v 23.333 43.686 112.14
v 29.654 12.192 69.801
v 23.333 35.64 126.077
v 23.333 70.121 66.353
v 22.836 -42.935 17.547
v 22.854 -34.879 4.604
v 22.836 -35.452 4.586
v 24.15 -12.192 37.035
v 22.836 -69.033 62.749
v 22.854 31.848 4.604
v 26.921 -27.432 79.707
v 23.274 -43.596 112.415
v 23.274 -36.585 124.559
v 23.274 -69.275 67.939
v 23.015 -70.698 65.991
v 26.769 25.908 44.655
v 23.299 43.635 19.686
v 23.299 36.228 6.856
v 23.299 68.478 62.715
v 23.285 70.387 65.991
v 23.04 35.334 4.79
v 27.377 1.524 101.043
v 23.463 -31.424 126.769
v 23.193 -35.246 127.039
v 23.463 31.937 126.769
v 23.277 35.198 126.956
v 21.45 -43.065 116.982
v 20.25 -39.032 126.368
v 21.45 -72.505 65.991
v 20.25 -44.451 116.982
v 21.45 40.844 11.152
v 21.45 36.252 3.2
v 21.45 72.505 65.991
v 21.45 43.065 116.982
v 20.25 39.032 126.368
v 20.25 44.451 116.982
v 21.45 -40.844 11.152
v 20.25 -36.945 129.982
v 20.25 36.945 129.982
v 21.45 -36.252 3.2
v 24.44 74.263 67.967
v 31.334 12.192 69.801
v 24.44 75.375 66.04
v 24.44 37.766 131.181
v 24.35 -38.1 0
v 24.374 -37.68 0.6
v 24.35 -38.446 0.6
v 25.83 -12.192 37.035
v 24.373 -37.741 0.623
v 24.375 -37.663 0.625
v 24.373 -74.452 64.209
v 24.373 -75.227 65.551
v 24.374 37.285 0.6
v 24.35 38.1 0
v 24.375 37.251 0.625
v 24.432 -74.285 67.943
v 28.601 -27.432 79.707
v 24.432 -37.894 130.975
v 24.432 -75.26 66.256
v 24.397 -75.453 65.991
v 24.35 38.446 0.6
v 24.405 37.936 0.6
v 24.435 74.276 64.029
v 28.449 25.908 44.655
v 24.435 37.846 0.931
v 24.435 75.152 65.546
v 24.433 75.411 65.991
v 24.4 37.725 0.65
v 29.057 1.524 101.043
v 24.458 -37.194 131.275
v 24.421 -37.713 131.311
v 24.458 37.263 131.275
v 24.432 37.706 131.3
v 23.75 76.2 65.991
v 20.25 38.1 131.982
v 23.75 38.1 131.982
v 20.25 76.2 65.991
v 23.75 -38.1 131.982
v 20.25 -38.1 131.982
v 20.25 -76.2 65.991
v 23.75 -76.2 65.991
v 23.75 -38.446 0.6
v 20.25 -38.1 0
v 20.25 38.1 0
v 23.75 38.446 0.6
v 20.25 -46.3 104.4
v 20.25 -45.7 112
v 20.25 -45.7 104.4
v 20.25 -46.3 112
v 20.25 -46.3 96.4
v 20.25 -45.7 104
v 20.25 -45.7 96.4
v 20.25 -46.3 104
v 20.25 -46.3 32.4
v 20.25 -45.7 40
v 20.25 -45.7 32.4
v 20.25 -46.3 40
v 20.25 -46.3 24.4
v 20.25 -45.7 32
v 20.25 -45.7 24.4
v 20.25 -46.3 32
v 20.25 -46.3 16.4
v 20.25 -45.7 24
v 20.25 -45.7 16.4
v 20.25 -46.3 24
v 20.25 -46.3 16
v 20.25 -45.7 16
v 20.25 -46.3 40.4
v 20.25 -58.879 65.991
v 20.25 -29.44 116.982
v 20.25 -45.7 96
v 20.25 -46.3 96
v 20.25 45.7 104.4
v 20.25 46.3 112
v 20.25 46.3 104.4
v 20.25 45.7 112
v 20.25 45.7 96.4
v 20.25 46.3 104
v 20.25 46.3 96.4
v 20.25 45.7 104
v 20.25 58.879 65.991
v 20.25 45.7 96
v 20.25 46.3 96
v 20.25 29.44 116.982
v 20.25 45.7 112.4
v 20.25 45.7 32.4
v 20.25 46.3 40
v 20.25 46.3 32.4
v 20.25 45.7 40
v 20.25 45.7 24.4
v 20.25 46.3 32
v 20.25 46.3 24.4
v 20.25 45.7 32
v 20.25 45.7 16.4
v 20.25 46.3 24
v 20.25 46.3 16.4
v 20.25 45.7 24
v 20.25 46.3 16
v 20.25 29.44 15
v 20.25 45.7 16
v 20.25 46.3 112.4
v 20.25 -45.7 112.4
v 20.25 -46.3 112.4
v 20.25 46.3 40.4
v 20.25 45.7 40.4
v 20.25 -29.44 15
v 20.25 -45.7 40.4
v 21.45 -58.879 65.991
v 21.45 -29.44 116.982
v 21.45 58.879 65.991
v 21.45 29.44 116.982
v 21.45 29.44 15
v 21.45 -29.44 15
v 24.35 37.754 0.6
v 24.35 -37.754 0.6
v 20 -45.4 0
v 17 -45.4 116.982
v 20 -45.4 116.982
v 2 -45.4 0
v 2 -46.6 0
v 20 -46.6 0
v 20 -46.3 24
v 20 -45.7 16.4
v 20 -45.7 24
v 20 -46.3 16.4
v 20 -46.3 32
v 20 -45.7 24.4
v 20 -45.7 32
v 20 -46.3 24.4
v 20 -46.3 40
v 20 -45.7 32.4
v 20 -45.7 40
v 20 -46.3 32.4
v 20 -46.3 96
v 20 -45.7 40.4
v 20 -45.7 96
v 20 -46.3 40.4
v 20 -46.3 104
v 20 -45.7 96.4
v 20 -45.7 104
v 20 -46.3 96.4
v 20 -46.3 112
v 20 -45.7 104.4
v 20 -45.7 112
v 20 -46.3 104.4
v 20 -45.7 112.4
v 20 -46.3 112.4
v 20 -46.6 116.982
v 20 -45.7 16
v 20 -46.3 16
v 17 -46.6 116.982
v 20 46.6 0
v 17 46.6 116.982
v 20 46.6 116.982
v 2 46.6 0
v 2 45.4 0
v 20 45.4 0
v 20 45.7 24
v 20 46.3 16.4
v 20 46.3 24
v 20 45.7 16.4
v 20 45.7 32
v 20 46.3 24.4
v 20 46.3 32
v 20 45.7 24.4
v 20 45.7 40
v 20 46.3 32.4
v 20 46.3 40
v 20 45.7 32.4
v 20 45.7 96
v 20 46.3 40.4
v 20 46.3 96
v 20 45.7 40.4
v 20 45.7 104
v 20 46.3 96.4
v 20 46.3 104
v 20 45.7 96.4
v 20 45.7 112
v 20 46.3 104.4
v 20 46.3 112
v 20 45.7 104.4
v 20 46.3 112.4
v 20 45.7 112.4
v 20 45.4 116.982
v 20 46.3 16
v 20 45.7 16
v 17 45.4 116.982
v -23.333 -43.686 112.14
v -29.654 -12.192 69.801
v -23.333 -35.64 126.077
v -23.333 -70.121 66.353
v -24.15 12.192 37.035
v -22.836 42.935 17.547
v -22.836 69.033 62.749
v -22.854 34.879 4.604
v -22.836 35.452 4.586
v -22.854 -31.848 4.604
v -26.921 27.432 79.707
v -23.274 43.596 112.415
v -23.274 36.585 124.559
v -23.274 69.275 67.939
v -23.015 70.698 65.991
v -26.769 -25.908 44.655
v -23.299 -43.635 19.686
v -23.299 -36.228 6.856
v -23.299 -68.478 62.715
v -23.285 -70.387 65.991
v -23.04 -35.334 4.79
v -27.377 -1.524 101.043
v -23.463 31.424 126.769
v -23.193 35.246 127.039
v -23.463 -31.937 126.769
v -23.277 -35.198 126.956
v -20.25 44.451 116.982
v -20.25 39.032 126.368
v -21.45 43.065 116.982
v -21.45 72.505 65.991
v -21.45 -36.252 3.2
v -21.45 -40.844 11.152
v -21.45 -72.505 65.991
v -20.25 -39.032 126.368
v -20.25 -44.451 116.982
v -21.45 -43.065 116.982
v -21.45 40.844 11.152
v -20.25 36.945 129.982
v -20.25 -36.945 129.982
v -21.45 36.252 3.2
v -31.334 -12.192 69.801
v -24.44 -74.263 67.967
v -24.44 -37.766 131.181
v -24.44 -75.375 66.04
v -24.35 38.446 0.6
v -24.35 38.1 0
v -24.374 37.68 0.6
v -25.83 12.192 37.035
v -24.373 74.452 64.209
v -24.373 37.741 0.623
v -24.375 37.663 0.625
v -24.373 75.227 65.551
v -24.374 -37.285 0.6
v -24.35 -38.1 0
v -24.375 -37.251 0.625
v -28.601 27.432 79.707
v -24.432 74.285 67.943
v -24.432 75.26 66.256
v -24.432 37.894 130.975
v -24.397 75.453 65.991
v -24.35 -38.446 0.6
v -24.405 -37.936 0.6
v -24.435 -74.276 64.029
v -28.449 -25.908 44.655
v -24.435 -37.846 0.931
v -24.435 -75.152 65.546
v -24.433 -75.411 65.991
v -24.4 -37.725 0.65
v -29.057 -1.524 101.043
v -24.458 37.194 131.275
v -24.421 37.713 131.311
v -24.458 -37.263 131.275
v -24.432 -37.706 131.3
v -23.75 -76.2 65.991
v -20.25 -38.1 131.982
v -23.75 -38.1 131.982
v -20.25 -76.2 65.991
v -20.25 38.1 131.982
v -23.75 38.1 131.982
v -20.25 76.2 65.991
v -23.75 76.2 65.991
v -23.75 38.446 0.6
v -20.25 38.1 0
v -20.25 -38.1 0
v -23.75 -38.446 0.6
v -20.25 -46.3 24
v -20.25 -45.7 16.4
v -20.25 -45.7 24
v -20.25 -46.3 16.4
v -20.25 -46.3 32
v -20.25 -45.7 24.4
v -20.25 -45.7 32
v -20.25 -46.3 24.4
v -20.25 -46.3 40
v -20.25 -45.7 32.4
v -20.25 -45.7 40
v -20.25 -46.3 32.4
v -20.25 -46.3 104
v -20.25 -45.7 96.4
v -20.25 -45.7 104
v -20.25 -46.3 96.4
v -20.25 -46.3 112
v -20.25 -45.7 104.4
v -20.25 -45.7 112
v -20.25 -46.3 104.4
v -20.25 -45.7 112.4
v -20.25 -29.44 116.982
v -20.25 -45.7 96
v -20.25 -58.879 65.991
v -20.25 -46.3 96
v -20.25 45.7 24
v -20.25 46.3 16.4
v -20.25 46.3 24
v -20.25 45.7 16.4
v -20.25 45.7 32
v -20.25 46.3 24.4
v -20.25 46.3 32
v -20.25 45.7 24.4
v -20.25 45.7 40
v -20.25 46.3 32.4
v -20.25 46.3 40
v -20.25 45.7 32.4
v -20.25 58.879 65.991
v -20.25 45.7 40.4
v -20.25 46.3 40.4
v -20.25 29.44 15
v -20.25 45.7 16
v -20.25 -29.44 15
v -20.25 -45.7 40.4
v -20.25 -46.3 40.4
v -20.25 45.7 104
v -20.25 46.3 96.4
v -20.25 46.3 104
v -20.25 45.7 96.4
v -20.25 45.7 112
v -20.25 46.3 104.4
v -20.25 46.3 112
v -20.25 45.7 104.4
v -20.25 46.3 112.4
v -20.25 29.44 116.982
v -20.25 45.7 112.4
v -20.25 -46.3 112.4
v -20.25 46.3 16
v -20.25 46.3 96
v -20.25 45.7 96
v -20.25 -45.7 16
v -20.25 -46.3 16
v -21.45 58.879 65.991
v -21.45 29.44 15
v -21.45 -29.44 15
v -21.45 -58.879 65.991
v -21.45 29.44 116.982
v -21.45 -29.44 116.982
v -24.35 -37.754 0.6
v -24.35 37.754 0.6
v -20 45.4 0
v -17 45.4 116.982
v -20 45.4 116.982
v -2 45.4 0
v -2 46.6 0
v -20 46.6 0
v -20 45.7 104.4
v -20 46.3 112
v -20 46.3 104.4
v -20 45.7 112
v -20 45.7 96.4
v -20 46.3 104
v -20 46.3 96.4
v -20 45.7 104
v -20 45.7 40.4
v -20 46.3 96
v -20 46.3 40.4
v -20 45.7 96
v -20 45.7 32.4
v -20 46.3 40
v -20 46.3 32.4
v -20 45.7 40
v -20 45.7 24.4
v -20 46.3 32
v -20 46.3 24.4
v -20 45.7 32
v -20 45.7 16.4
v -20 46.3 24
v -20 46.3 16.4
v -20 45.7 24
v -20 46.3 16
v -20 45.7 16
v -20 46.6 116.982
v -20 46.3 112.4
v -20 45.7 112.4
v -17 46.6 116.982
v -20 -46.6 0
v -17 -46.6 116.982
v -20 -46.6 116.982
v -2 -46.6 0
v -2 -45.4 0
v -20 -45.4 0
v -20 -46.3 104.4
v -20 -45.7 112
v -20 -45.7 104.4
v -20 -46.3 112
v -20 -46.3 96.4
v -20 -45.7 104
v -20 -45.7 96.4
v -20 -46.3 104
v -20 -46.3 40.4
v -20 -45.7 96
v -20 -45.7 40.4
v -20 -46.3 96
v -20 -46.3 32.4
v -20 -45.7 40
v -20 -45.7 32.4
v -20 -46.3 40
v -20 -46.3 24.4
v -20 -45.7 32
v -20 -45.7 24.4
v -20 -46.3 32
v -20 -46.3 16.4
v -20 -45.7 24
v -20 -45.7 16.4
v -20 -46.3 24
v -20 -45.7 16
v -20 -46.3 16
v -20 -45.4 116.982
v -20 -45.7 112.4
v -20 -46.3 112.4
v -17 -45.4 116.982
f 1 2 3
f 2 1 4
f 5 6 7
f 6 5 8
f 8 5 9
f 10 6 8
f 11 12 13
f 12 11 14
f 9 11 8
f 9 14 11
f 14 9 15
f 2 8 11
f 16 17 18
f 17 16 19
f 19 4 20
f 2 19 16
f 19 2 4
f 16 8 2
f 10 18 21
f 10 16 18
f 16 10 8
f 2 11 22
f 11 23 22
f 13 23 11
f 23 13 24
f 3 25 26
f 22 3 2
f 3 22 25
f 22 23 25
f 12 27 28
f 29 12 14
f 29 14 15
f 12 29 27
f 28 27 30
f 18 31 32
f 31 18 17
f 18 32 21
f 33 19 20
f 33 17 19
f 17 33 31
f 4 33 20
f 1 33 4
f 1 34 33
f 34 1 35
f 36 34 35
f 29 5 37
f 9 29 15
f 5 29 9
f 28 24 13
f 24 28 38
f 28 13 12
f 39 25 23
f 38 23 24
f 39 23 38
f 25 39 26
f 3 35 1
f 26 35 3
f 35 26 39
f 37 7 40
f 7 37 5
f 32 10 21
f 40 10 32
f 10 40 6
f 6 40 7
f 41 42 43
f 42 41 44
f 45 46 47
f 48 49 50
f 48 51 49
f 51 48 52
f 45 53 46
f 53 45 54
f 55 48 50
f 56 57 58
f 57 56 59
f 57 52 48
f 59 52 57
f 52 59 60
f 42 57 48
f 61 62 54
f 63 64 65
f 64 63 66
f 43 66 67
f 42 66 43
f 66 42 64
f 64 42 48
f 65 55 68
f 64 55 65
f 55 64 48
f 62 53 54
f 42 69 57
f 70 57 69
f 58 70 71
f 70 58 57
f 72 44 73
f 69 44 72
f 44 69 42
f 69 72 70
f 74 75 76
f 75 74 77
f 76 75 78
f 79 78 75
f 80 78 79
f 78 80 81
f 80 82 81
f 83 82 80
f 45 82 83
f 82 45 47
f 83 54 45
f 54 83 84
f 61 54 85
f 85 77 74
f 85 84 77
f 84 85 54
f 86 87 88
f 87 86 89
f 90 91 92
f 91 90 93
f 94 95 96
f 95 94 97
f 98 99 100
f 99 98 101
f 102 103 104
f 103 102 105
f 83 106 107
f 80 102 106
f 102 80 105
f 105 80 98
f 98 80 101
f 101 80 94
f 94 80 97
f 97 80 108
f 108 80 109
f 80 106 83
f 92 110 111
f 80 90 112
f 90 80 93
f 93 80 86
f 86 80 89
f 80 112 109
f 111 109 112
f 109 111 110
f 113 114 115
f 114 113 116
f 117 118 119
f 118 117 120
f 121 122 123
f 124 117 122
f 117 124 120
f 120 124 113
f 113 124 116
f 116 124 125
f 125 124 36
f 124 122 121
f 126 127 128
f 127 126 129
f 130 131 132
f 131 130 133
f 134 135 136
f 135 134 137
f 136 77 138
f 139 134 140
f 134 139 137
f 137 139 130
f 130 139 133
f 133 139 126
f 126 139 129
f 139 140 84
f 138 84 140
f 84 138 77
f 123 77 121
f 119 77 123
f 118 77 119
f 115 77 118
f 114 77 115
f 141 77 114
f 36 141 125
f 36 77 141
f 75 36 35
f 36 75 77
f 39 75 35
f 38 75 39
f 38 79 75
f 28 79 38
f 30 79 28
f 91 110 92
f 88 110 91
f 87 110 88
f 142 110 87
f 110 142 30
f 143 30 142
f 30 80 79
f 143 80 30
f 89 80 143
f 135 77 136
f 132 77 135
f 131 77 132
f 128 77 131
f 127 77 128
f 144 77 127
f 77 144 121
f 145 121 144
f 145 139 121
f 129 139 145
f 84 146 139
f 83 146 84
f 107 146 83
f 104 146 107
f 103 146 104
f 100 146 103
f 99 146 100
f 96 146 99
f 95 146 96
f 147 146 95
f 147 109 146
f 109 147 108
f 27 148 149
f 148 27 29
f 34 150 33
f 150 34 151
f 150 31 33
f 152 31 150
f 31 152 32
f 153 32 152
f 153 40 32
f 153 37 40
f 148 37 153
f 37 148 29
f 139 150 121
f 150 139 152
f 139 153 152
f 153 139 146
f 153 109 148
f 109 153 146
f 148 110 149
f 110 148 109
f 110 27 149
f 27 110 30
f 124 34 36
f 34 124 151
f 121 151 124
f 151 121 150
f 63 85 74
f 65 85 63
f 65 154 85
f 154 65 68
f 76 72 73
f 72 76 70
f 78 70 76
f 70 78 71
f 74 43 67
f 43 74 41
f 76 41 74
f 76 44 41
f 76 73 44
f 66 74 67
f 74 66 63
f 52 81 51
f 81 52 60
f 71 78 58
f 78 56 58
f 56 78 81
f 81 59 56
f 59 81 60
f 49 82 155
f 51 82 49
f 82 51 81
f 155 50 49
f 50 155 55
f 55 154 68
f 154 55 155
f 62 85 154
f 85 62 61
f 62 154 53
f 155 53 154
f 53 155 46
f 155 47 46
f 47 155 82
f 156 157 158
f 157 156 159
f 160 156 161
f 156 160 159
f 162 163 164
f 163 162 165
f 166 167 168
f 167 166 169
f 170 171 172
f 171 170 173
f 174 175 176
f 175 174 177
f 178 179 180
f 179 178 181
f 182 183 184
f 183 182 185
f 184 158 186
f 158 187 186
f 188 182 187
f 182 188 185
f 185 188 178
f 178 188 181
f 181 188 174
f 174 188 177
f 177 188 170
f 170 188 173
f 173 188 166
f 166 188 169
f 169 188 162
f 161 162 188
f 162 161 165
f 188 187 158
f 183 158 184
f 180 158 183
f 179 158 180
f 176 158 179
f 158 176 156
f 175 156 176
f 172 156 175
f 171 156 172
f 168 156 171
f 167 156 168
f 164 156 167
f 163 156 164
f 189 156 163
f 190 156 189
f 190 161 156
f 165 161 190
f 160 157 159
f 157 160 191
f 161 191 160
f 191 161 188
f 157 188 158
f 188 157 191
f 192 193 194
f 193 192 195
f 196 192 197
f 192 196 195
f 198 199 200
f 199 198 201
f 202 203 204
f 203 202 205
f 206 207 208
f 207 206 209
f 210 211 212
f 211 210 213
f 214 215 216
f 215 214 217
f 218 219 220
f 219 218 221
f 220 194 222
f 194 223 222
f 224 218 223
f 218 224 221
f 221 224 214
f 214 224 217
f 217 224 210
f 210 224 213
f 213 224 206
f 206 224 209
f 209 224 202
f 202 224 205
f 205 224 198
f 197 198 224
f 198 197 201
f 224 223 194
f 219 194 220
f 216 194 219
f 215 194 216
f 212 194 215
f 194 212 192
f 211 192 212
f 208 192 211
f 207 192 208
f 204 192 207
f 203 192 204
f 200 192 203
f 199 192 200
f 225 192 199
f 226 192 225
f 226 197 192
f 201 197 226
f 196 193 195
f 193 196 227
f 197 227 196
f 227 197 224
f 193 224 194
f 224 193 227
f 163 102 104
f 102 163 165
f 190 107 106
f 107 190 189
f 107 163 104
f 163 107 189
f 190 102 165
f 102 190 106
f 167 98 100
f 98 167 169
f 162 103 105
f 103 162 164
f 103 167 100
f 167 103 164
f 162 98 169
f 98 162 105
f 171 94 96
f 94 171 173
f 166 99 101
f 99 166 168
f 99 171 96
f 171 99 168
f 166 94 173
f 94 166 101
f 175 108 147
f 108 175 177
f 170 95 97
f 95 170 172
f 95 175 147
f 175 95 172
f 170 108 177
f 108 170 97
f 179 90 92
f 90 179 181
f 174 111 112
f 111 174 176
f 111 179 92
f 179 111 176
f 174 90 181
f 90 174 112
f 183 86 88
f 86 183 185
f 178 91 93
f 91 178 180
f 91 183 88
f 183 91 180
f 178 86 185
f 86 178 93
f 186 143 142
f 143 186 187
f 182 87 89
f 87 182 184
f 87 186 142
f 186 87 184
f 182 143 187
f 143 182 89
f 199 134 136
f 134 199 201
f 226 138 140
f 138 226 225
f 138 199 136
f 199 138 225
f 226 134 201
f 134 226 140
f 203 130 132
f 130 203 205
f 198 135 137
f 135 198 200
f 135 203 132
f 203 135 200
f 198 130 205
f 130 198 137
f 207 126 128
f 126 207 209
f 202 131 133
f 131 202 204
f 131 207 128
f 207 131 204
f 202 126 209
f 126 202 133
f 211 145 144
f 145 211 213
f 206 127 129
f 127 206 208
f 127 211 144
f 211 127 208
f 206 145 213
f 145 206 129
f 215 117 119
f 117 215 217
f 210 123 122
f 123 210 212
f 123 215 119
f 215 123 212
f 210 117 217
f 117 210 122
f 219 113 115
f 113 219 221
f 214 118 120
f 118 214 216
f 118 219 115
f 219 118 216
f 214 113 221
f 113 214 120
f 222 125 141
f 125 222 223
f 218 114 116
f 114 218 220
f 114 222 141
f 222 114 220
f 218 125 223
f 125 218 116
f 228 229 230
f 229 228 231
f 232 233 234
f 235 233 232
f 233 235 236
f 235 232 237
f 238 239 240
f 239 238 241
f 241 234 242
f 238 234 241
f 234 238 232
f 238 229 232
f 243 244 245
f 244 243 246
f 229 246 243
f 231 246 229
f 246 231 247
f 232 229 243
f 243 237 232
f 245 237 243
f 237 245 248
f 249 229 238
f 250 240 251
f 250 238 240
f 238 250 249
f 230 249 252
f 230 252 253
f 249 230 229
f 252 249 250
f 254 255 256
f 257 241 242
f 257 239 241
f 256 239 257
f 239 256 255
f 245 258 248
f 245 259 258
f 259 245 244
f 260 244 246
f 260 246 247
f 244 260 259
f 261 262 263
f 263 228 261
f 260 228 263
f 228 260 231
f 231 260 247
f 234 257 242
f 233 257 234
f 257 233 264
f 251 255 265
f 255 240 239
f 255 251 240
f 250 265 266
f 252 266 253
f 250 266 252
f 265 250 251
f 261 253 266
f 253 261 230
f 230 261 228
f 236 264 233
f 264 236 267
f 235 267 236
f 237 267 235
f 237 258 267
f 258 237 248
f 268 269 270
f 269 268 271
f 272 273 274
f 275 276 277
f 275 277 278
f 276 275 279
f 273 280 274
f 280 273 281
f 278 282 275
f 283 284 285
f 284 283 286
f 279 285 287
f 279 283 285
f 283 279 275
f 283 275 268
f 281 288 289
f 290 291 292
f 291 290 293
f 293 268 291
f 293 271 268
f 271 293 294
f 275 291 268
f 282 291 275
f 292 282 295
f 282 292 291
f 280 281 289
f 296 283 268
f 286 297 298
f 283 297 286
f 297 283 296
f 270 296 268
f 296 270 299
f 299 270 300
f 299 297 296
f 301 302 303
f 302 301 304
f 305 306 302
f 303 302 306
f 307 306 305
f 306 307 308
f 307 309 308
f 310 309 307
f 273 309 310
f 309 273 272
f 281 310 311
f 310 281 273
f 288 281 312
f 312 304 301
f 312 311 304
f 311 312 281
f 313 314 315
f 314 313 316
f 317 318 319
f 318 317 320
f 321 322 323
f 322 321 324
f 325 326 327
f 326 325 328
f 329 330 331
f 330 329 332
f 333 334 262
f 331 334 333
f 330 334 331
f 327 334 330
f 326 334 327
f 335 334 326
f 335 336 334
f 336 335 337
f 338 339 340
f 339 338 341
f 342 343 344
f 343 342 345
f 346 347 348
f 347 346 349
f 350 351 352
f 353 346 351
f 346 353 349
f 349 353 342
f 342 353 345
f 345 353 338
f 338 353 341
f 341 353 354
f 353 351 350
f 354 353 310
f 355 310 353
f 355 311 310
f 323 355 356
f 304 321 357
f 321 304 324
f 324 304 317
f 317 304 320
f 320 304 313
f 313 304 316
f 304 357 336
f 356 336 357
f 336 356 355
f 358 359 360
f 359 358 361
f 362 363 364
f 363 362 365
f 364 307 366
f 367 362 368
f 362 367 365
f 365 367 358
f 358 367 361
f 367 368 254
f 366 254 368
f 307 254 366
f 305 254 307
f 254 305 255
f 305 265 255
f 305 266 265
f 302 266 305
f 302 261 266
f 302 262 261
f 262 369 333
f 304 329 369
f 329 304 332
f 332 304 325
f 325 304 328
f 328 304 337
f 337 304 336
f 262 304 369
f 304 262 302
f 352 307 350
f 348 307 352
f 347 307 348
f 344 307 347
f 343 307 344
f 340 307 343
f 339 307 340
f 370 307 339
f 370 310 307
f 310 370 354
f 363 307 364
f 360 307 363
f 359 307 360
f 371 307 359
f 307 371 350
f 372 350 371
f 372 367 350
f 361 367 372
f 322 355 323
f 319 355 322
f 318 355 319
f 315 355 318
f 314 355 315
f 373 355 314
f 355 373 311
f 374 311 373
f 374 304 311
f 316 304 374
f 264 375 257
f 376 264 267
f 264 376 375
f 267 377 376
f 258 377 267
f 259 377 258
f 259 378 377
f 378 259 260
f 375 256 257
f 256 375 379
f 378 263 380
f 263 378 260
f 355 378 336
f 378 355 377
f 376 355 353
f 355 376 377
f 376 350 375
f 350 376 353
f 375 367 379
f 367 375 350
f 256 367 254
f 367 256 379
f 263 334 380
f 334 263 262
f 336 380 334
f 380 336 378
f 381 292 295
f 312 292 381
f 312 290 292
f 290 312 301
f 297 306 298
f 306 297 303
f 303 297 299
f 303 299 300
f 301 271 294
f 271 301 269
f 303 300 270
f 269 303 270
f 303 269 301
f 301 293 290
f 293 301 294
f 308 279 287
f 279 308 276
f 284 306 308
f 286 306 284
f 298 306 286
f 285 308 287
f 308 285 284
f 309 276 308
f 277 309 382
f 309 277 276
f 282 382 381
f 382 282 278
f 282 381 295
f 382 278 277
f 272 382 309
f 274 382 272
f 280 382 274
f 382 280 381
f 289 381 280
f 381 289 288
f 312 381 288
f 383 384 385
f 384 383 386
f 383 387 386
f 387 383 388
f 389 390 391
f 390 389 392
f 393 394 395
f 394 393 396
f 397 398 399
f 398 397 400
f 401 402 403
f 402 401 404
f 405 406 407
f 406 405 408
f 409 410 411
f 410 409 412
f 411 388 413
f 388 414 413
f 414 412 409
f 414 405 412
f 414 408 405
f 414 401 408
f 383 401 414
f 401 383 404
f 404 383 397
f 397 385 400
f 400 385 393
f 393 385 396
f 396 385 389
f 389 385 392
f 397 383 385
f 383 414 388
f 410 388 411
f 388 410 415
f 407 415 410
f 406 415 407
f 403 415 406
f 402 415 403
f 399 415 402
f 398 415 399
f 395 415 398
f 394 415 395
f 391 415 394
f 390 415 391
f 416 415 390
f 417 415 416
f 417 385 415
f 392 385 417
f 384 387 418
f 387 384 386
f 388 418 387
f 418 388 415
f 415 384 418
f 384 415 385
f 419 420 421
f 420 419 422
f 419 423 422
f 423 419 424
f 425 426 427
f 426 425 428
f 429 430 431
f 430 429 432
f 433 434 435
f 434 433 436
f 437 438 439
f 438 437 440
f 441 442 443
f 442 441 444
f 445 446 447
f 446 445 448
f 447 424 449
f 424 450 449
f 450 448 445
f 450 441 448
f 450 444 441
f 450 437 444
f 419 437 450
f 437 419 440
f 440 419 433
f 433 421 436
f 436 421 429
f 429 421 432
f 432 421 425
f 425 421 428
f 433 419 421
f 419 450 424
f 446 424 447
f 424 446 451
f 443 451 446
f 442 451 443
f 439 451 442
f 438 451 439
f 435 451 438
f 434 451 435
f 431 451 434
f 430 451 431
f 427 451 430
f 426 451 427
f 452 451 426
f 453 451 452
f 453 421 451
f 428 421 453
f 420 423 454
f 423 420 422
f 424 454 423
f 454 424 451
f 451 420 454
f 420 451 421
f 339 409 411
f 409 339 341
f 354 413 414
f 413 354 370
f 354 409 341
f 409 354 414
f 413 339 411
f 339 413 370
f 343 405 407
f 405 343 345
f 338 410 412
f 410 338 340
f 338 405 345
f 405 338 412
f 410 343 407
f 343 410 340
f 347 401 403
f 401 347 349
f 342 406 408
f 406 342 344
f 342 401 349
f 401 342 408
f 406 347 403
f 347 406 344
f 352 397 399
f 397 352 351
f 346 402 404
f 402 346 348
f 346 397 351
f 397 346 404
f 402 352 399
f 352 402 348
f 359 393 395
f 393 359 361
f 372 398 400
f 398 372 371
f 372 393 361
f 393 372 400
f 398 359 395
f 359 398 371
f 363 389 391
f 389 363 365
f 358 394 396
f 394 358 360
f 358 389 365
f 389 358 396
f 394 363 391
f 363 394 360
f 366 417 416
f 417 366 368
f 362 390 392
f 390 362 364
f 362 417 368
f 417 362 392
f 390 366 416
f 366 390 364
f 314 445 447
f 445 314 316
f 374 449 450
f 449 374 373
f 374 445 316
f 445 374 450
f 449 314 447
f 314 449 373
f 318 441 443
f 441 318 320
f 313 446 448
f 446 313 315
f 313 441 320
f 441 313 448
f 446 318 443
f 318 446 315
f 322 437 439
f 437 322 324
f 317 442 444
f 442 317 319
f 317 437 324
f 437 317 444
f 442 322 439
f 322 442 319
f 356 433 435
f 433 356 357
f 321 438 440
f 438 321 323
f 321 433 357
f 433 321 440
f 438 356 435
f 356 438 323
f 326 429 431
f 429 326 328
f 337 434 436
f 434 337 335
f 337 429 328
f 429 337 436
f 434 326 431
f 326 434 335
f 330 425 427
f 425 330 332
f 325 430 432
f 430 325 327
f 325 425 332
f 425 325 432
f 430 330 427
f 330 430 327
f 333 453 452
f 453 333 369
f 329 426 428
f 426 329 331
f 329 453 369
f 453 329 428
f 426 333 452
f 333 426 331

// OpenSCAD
/* HEX TILE v76 — reviewed native parametric OpenSCAD; millimetres.
   Standalone: no imports, missing modules, embedded STL or fused base rail.
   Default (v76) is TWO UNJOINED tiles, each braced by two back-border fins.
   'pair' keeps the v75 tacked pair. 'chain' lays out independent pairs.
   F5 = preview. F6 = render; then File > Export > STL.
   Fins: one material → 'finned' (fins kiss the border through small tacks;
   cut the tacks, then lift the fin away). Two materials → set fin_gap = 0,
   export 'finned_tiles' and 'finned_fins', load both as parts of one object
   and give the fins Support for PLA (or PETG).
   Pair: cut center necks before separating. Do not twist, peel or pry tile faces.
   Geometry checks cannot certify clean release, finish or print stability.
   OpenSCAD 2026.10.11 + Manifold tested; slicer remains authoritative.
*/

/* [Output] */
output = "finned"; // [finned, finned_tiles, finned_fins, pair, chain, wall, flat, separated, tabs, section, release_test]
inspection_spacing = 18;
show_markers = false; // Preview only; excluded from exported geometry.

/* [Tile geometry] */
size_in = 6;
edge_depth = 4.1;
rim = 2.0;
skin = 1.68; // v73: was 1.2 (v70–v72); 1.7 trips the clearance assert by float rounding. Vertical offset of faceted surface; not normal wall thickness.
relief_scale = 1.0;
front_chamfer = 0.6; // v73: back to v70 (v72 had 0.15, chip-prone edge).
// v74: leave the bed edge square. v73's 0.6 chamfer there undercut the first layer
// (9.0 mm footprint vs 10.4 mm just above); four upright prints tore off above the brim.
chamfer_bed_edge = false;
back_edge_chamfer = 0; // Maximize flat mounting surface; optional small bevel.
/* [Open back and wall-mounting flange] */
back_ring_width = 15;    // Wide enough for ~1/2 in (12.7 mm) foam tape with placement margin.
back_ring_t = 1.2;

// Keep the broad horizontal top flange omitted for upright printing.
// The other five continuous flange segments remain supported as they grow.
include_top_flange = false;
minimum_front_clearance = 1.2;

/* [Cuttable connections] */
pair_gap = 2.0;
root_width = 1.0;
root_height = 0.6;
root_overlap = 0.30; // Embed into flange, not a prediction of residual stub height.
neck_width = 0.60;
neck_height = 0.40;
neck_length = 0.40;
tab_pitch = 13; // v75: was 12 (7 tacks/side, 42/pair); 13 gives 6/side, 36/pair. Owner: "hard to seperate".

/* [Layer checks — match slicer] */
layer_height = 0.20;
first_layer_height = 0.20;
line_width = 0.42; // Check only; SCAD cannot set slicer extrusion width/nozzle.
enforce_event_limits = true;
root_event_limit = 2;       // Per-pair root transition cap.
all_event_limit = 3;        // Per-pair root + neck transition cap.

// Preserve the proven v70 three-pair chain while making its aggregate
// transition budget explicit. Lower these if slicer testing supports it.
enforce_batch_event_limits = true;
batch_root_event_limit = 6;
batch_all_event_limit = 9;

/* [Back-border fins — v76] */
// Owner, 27 Oct: tacks "Hard still to seperate. Not clean"; asked for fins
// "on the back of them on the border". Each tile prints alone; two triangular
// fins stand behind its back and touch only the tape flange.
fin_y = 46;            // Fin distance from the tile centre, along its width.
fin_depth = 18;        // Fin reach behind the back, at the bed.
fin_top_depth = 3;     // Fin reach at its top.
fin_t = 1.2;           // Fin thickness (about three 0.42 mm lines).
fin_height = 0;        // 0 = up to the top of the flange at fin_y.
fin_gap = 0.25;        // Air between fin and flange. 0 = touching (second material only).
fin_tack_pitch = 8;    // Vertical spacing of tacks across fin_gap.
fin_tack_width = 0.6;  // Along the tile width; must fit inside fin_t.
fin_tack_height = 0.4; // Whole layers.
fin_tack_reach = 0.3;  // Embed into fin and into flange.
fin_clearance = 4;     // Air between the two tiles' fins.

/* [Batch and bed — conservative rectangular check] */
chain_count = 3;
chain_gap = 6;
bed_width = 256;
bed_depth = 256;
bed_height = 256;
planned_brim = 10; // Used only in fit check; set brim separately in the slicer.
bed_margin = 5;

/* [Release sample — real lower rim, flange and front skin] */
sample_width = 24;
sample_height = 18;
sample_spacing = 10;

/* [Hidden] */
eps = 0.01;
R = size_in*25.4/2;
AP = R*cos(30);
relief_max = 0.091654*R*relief_scale;
front_max = edge_depth+relief_max;
D = front_max+1;
pair_width = 2*front_max+pair_gap;
N = max(2,ceil(R/tab_pitch));
lo = root_height/2+0.10;
hi = rim-root_height/2;
phase = [0,0,0.18,0.33,0,-0.17];
joined_mode = output=="pair" || output=="chain" || output=="section";
uses_tabs = joined_mode || output=="tabs";
integer_tolerance = 0.0001;

function dot2(a,b) = a[0]*b[0]+a[1]*b[1];
function lerp(a,b,t) = a+(b-a)*t;
function integer_value(x) = abs(x-round(x))<integer_tolerance;

/* Fin placement. Tile-local 2D: x = width, y = height (centre 0). */
finned_mode =
    output=="finned" || output=="finned_tiles" || output=="finned_fins";

function in_hex(x,y,a) =
    abs(y)<=a && abs(x)*cos(30)+abs(y)*sin(30)<=a;

// True where the tape flange (back border) has material.
function on_flange(x,y) =
    in_hex(x,y,AP) &&
    !in_hex(x,y,AP-back_ring_width) &&
    (include_top_flange || y<=AP-back_ring_width);

// Highest flange point straight above fin_y.
flange_top_at_fin =
    min(
        abs(fin_y)>R/2 ? (R-abs(fin_y))*tan(60) : AP,
        include_top_flange ? AP : AP-back_ring_width
    );

fin_top = fin_height>0 ? fin_height-AP : flange_top_at_fin; // Tile-local.
fin_spacing = 2*(fin_gap+fin_depth)+fin_clearance;           // Back to back.

// A tack is kept only where all four of its corners land on the flange.
function tack_fits(y) =
    on_flange(fin_y-fin_tack_width/2,y-fin_tack_height/2) &&
    on_flange(fin_y+fin_tack_width/2,y-fin_tack_height/2) &&
    on_flange(fin_y-fin_tack_width/2,y+fin_tack_height/2) &&
    on_flange(fin_y+fin_tack_width/2,y+fin_tack_height/2);

// Tack bottoms on bed-aligned layer boundaries (bed at y = -AP).
fin_tack_ys = [
    for(k=[1:floor((fin_top+AP)/fin_tack_pitch)])
        let(
            z=round(k*fin_tack_pitch/layer_height)*layer_height,
            y=z-AP+fin_tack_height/2
        )
        if(y+fin_tack_height/2<=fin_top && tack_fits(y)) y
];

function hex_point(s,inset) =
    let(rr=(AP-inset)/cos(30))
    [rr*cos(60*s),rr*sin(60*s)];

function inset_at(s,i) =
    s==1 ? lerp(lo,hi-0.1,i/(N-1)) :
    s==4 ? lerp(lo+0.1,hi,i/(N-1)) :
    rim/2;

function raw_center(s,i) =
    let(ins=inset_at(s,i),t=(i+0.5+phase[s])/N)
    lerp(hex_point(s,ins),hex_point(s+1,ins),t);

// Root bottom snaps to a BED-ALIGNED layer boundary.
// Its width coordinate remains unchanged.
function bed_layer_index(z) =
    floor((z-first_layer_height)/layer_height+0.5);

function layer_boundary(k) =
    first_layer_height+k*layer_height;

function tab_center(s,i) =
    let(
        p=raw_center(s,i),
        k=bed_layer_index(p[1]+AP-root_height/2)
    )
    [p[0],layer_boundary(k)+root_height/2-AP];

centers = [
    for(s=[0:5],i=[0:N-1])
        tab_center(s,i)
];

function root_bottom_layer(p) =
    bed_layer_index(p[1]+AP-root_height/2);

root_layers = round(root_height/layer_height);
neck_layers = round(neck_height/layer_height);

root_events = [
    for(p=centers,d=[0,root_layers])
        root_bottom_layer(p)+d
];

// Count each distinct transition once per join:
// root start, neck end, root end.
all_events =
    neck_layers==root_layers
    ? root_events
    : [
        for(p=centers,d=[0,neck_layers,root_layers])
            root_bottom_layer(p)+d
    ];

function event_peak(events) =
    max([
        for(k=events)
            len([for(e=events) if(e==k) 1])
    ]);

root_peak = event_peak(root_events);
all_peak = event_peak(all_events);

// For chain output, all independent pairs are aligned and therefore
// transition on the same bed layers. Enforce limits against the full batch.
effective_root_peak = output=="chain" ? root_peak*chain_count : root_peak;
effective_all_peak = output=="chain" ? all_peak*chain_count : all_peak;

within_side_pitch = max([
    for(s=[0:5],i=[0:N-2])
        norm(tab_center(s,i+1)-tab_center(s,i))
]);

corner_pitch = max([
    for(s=[0:5])
        norm(tab_center((s+1)%6,0)-tab_center(s,N-1))
]);

actual_pitch = max(within_side_pitch,corner_pitch);

function rim_distance(p) =
    AP-max([
        for(s=[0:5])
            dot2(p,[cos(30+60*s),sin(30+60*s)])
    ]);

root_corners = [
    for(p=centers,dy=[-1,1],dz=[-1,1])
        p+[dy*root_width/2,dz*root_height/2]
];

root_outer_margin =
    min([for(p=root_corners) rim_distance(p)]);

root_inner_distance =
    max([for(p=root_corners) rim_distance(p)]);

/* Dimension and topology guards */

assert(
    size_in>=3 && size_in<=10,
    "Size must be 3–10 inches"
);

assert(
    edge_depth>0 && skin>0 && relief_scale>0,
    "Invalid body dimensions"
);

assert(
    rim>=1.5 && rim<AP/4,
    "Rim outside supported range"
);

assert(
    back_ring_t>0 &&
    back_ring_width>=0 &&
    back_ring_width<=AP/2,
    "Invalid flange"
);
assert(
    edge_depth-skin-back_ring_t>=minimum_front_clearance,
    "Flange too close to front skin"
);

assert(
    minimum_front_clearance>0,
    "Front clearance must be positive"
);

assert(
    front_chamfer>=0 &&
    front_chamfer<min(rim,edge_depth),
    "Invalid front chamfer"
);

assert(
    back_edge_chamfer>=0 &&
    back_edge_chamfer<min(rim,back_ring_t),
    "Invalid back bevel"
);

assert(
    layer_height>0 &&
    first_layer_height>0 &&
    line_width>0,
    "Invalid slicer check values"
);

assert(
    pair_gap>=1.5 && pair_gap<=3,
    "Pair gap must be 1.5–3 mm"
);

assert(
    root_height>0 &&
    root_height<=1 &&
    root_width>neck_width &&
    root_width<=1.2,
    "Invalid root"
);

assert(
    neck_width>=line_width &&
    neck_height>=layer_height &&
    neck_height<=root_height,
    "Unprintable neck dimensions"
);

assert(
    neck_length>0 && neck_length<pair_gap,
    "Neck must fit in gap"
);

assert(
    root_overlap>0 && root_overlap<back_ring_t,
    "Root overlap must fit flange thickness"
);

assert(
    integer_value(root_height/layer_height) &&
    integer_value(neck_height/layer_height),
    "Root/neck heights must be whole layers"
);

assert(
    tab_pitch>0 && hi>lo+0.1,
    "Invalid tab spacing or rim allowance"
);

assert(
    !uses_tabs || actual_pitch<=tab_pitch,
    "Actual tab spacing exceeds requested pitch"
);

assert(
    !uses_tabs ||
    (
        root_outer_margin>eps &&
        root_inner_distance<=rim+eps
    ),
    "A root extends outside the supported rim; revise dimensions"
);

assert(
    !joined_mode || back_ring_width>=rim,
    "Joined outputs require a supporting tape flange"
);

assert(
    !uses_tabs ||
    !enforce_event_limits ||
    (
        root_peak<=root_event_limit &&
        all_peak<=all_event_limit
    ),
    "Per-pair layer transition burst: adjust layout or deliberately revise limits"
);

assert(
    output!="chain" ||
    !enforce_batch_event_limits ||
    (
        effective_root_peak<=batch_root_event_limit &&
        effective_all_peak<=batch_all_event_limit
    ),
    "Whole-chain layer transition burst: reduce chain count or revise batch limits deliberately"
);

assert(
    integer_value(chain_count) &&
    chain_count>=1 &&
    chain_count<=8,
    "Batch count must be integer 1–8"
);

assert(
    chain_gap>0 && inspection_spacing>=0,
    "Invalid spacing"
);

assert(
    output!="release_test" ||
    (
        sample_width>=root_width+4 &&
        sample_width<R &&
        sample_height>8 &&
        sample_height<AP/2
    ),
    "Invalid sample dimensions"
);

assert(
    back_ring_width>=4 || output!="release_test",
    "Sample needs at least 4 mm tape flange"
);

assert(
    planned_brim>=0 &&
    bed_margin>=0 &&
    min(bed_width,bed_depth,bed_height)>0,
    "Invalid bed check"
);

assert(
    !finned_mode ||
    (
        fin_t>=2*line_width &&
        fin_depth>fin_top_depth &&
        fin_top_depth>=line_width &&
        abs(fin_y)+fin_t/2<R-rim &&
        fin_top>-AP+fin_depth
    ),
    "Invalid fin dimensions"
);

assert(
    !finned_mode ||
    (
        fin_gap>=0 &&
        fin_tack_width>=line_width &&
        fin_tack_width<=fin_t &&
        fin_tack_reach>fin_gap/2 &&
        fin_tack_reach<back_ring_t &&
        integer_value(fin_tack_height/layer_height)
    ),
    "Unprintable fin tack dimensions"
);

assert(
    !finned_mode || fin_gap==0 || len(fin_tack_ys)>=2,
    "Fewer than two tacks reach the flange: move fin_y or change fin_tack_pitch"
);

assert(
    output=="finned" ||
    output=="finned_tiles" ||
    output=="finned_fins" ||
    output=="pair" ||
    output=="chain" ||
    output=="wall" ||
    output=="flat" ||
    output=="separated" ||
    output=="tabs" ||
    output=="section" ||
    output=="release_test",
    "Unknown output"
);

/* Conservative layout bounds.
   Includes planned brim and margins.
   Does not model printer exclusion zones. */

layout_x =
    output=="chain"
        ? chain_count*pair_width+(chain_count-1)*chain_gap :
    output=="release_test"
        ? 3*pair_width+2*sample_spacing :
    output=="flat"
        ? 2*R :
    output=="wall"
        ? front_max :
    output=="separated"
        ? pair_width+inspection_spacing :
    finned_mode
        ? 2*front_max+fin_spacing :
    pair_width;

layout_y =
    output=="release_test"
        ? sample_width :
    output=="flat"
        ? 2*AP :
    2*R;

layout_z =
    output=="release_test"
        ? sample_height :
    output=="flat"
        ? front_max :
    2*AP;

print_layout =
    finned_mode ||
    output=="pair" ||
    output=="chain" ||
    output=="wall" ||
    output=="flat" ||
    output=="separated" ||
    output=="tabs" ||
    output=="section" ||
    output=="release_test";

assert(
    !print_layout ||
    (
        layout_x+2*(planned_brim+bed_margin)<=bed_width &&
        layout_y+2*(planned_brim+bed_margin)<=bed_depth &&
        layout_z<=bed_height
    ),
    "Layout plus brim/margin exceeds bed; resize or reduce batch count"
);

echo(str(
    "v76 | ",output,
    " | ",6*N," joins/pair",
    " | max actual pitch ",actual_pitch," mm"
));

if(finned_mode)
    echo(str(
        "v76 fins | 2 per tile at ±",fin_y," mm",
        " | ",fin_top+AP," mm tall, ",fin_depth,"→",fin_top_depth," mm deep",
        " | gap ",fin_gap," mm",
        fin_gap>0
            ? str(" | ",len(fin_tack_ys)," tacks/fin at z ",[for(y=fin_tack_ys) y-fin_tack_height/2+AP])
            : " | touching: print fins in a second material"
    ));

echo(str(
    "BED-ALIGNED transitions: pair root=",root_peak,
    "; pair including neck=",all_peak,
    "; effective root=",effective_root_peak,
    "; effective including neck=",effective_all_peak
));

if(output=="chain")
    echo(str(
        "Chain contains ",chain_count,
        " independent pairs; aggregate caps root=",batch_root_event_limit,
        ", including neck=",batch_all_event_limit,"."
    ));

if(output=="flat")
    echo(
        "Flat mode is inspection/export only until support/bridging behavior is validated."
    );

if(include_top_flange)
    echo(
        "Full top flange enabled: inspect unsupported starts in the actual slice."
    );

echo(str(
    "Wall-mount flange: ",back_ring_width,
    " mm wide x ",back_ring_t,
    " mm thick on the printable five-edge perimeter; top flange omitted=",
    !include_top_flange
));

/* Native front geometry.
   Inherited v30/v57 low-poly facet topology.
   Coordinates are normalized to the corner radius. */

FP = [
    [ 1.00,  0.000000, 0.000000],
    [ 0.50,  0.866025, 0.000000],
    [-0.50,  0.866025, 0.000000],
    [-1.00,  0.000000, 0.000000],
    [-0.50, -0.866025, 0.000000],
    [ 0.50, -0.866025, 0.000000],
    [ 0.16,  0.050000, 0.091654],
    [-0.16, -0.380000, 0.019428],
    [-0.36,  0.180000, 0.055790],
    [ 0.34, -0.280000, 0.053795],
    [ 0.02,  0.460000, 0.061766]
];

FACES = [
    [0,6,1],
    [4,3,7],
    [5,4,7],
    [8,3,2],
    [7,3,8],
    [7,8,6],
    [5,9,0],
    [9,6,0],
    [9,7,6],
    [5,7,9],
    [6,8,10],
    [8,2,10],
    [6,10,1],
    [10,2,1],
    [1,12,11,0],
    [2,13,12,1],
    [3,14,13,2],
    [4,15,14,3],
    [5,16,15,4],
    [0,11,16,5],
    [11,12,13,14,15,16]
];

module hex2d(a) {
    circle(r=a/cos(30),$fn=6);
}

module faceted_solid(dz=0,zb=0) {
    polyhedron(
        points=concat(
            [
                for(p=FP)
                    [
                        p[0]*R,
                        p[1]*R,
                        edge_depth+p[2]*R*relief_scale+dz
                    ]
            ],
            [
                for(i=[0:5])
                    [FP[i][0]*R,FP[i][1]*R,zb]
            ]
        ),
        faces=FACES,
        convexity=12
    );
}

module cavity() {
    H = D+2;
    a = AP-rim+1;

    assert(
        a>H,
        "Size too small for requested cavity depth"
    );

    intersection() {
        faceted_solid(-skin,-1);

        translate([0,0,-1])
            linear_extrude(H,scale=(a-H)/a)
                hex2d(a);
    }
}

module front_envelope() {
    H = D+5;

    union() {
        translate([0,0,-eps])
            linear_extrude(
                edge_depth-front_chamfer+eps
            )
                hex2d(AP+eps);

        translate([0,0,edge_depth-front_chamfer])
            linear_extrude(
                H,
                scale=(AP-H)/AP
            )
                hex2d(AP);

        // Local -Y flat is the bed edge once upright (Z = local Y).
        if(!chamfer_bed_edge)
            translate([-R-1,-AP-1,-1])
                cube([2*R+2,1+front_chamfer,D+7]);
    }
}

// Keeps the interior while beveling the outside.
// Unlike v68, this does not subtract the center.
module back_envelope() {
    union() {
        linear_extrude(
            back_edge_chamfer,
            scale=AP/(AP-back_edge_chamfer)
        )
            hex2d(AP-back_edge_chamfer);

        translate([0,0,back_edge_chamfer])
            linear_extrude(D+1)
                hex2d(AP);
    }
}

module tape_flange() {
    if(back_ring_width>0)
        linear_extrude(back_ring_t)
            intersection() {
                difference() {
                    hex2d(AP);
                    hex2d(AP-back_ring_width);
                }

                // Preserve v70's proven open-top flange behavior for upright printing.
                if(!include_top_flange)
                    translate([-2*R,-2*AP])
                        square([
                            4*R,
                            3*AP-back_ring_width
                        ]);
            }
}

module tile() {
    intersection() {
        union() {
            difference() {
                faceted_solid();
                cavity();
            }

            tape_flange();
        }

        if(front_chamfer>0)
            front_envelope();
        else
            faceted_solid();

        if(back_edge_chamfer>0)
            back_envelope();
        else
            faceted_solid();
    }
}

// Canonical frame:
// X = depth, Y = tile width, Z = height.
// Back plane is X=0.
module oriented_tile() {
    multmatrix([
        [0,0,1,0],
        [1,0,0,0],
        [0,1,0,0],
        [0,0,0,1]
    ])
        tile();
}

module first_tile() {
    translate([pair_gap/2,0,0])
        oriented_tile();
}

module partner_tile() {
    rotate([0,0,180])
        first_tile();
}

module bodies() {
    first_tile();
    partner_tile();
}

module connection(h=neck_height) {
    assert(
        h>0 &&
        h<=root_height+integer_tolerance &&
        integer_value(h/layer_height),
        "Sample neck must fit the root in whole layers"
    );

    // Shared bottom plane.
    // The short arms taper toward the cuttable middle.
    bottom = -root_height/2;

    for(sign=[-1,1])
        hull() {
            translate([
                sign*(pair_gap/2+root_overlap/2),
                0,
                bottom+root_height/2
            ])
                cube([
                    root_overlap,
                    root_width,
                    root_height
                ],center=true);

            translate([
                sign*neck_length/2,
                0,
                bottom+h/2
            ])
                cube([
                    eps,
                    neck_width,
                    h
                ],center=true);
        }

    translate([0,0,bottom+h/2])
        cube([
            neck_length+eps,
            neck_width,
            h
        ],center=true);
}

module tabs() {
    for(p=centers)
        translate([0,p[0],p[1]])
            connection();
}

module pair_model() {
    union() {
        bodies();
        tabs();
    }
}

module chain_model() {
    for(i=[0:chain_count-1])
        translate([
            (i-(chain_count-1)/2)*
            (pair_width+chain_gap),
            0,
            0
        ])
            pair_model();
}

module separated_model() {
    color("#e9a480")
        translate([inspection_spacing/2,0,0])
            first_tile();

    color("#7fa7b6")
        translate([-inspection_spacing/2,0,0])
            partner_tile();
}

// Canonical frame, behind the back plane (X<0). Fins stand on the bed (Z=-AP)
// in the X–Z plane, so they resist the tile tipping over its thin base.
module back_fins() {
    for(s=[-1,1])
        translate([0,s*fin_y+fin_t/2,0])
            rotate([90,0,0])
                linear_extrude(fin_t)
                    polygon([
                        [-fin_gap,-AP],
                        [-fin_gap-fin_depth,-AP],
                        [-fin_gap-fin_top_depth,fin_top],
                        [-fin_gap,fin_top]
                    ]);
}

// Bridge fin_gap; each embeds fin_tack_reach into the fin and into the flange.
module fin_tacks() {
    for(s=[-1,1],y=fin_tack_ys)
        translate([
            -fin_gap-fin_tack_reach,
            s*fin_y-fin_tack_width/2,
            y-fin_tack_height/2
        ])
            cube([
                fin_gap+2*fin_tack_reach,
                fin_tack_width,
                fin_tack_height
            ]);
}

module finned_unit(tiles=true,fins=true) {
    if(tiles)
        oriented_tile();

    if(fins) {
        back_fins();

        if(fin_gap>0)
            fin_tacks();
    }
}

// Backs face each other; each tile's fins reach into the space between.
module finned_model(tiles=true,fins=true) {
    for(r=[0,180])
        rotate([0,0,r])
            translate([fin_spacing/2,0,0])
                finned_unit(tiles,fins);
}

module upright() {
    translate([0,0,AP])
        children();
}

module release_sample(h) {
    // A cropped section of the actual lower rim,
    // flange, cavity and visible front skin.
    // One join at a layer-aligned height.
    sample_join_z =
        first_layer_height+
        round(2/layer_height)*layer_height;

    union() {
        intersection() {
            upright()
                bodies();

            translate([
                -pair_width/2-eps,
                -sample_width/2,
                0
            ])
                cube([
                    pair_width+2*eps,
                    sample_width,
                    sample_height
                ]);
        }

        translate([
            0,
            0,
            sample_join_z+root_height/2
        ])
            connection(h);
    }
}

module release_test_plate() {
    // Left to right: one-, two-, three-layer necks.
    for(i=[0:2])
        translate([
            (i-1)*(pair_width+sample_spacing),
            0,
            0
        ])
            release_sample((i+1)*layer_height);
}

/* Output selection */

if(output=="flat")
    tile();

else if(output=="release_test")
    release_test_plate();

else
    upright() {
        if(output=="finned")
            finned_model();

        else if(output=="finned_tiles")
            finned_model(fins=false);

        else if(output=="finned_fins")
            finned_model(tiles=false);

        else if(output=="pair")
            pair_model();

        else if(output=="chain")
            chain_model();

        else if(output=="wall")
            oriented_tile();

        else if(output=="separated")
            separated_model();

        else if(output=="tabs")
            tabs();

        else if(output=="section")
            intersection() {
                pair_model();

                translate([
                    -pair_width,
                    -0.5,
                    -2*AP
                ])
                    cube([
                        2*pair_width,
                        1,
                        4*AP
                    ]);
            }

        if(
            $preview &&
            show_markers &&
            output!="wall"
        )
            for(p=centers)
                %color("red")
                    translate([0,p[0],p[1]])
                        sphere(r=1,$fn=16);
    }
